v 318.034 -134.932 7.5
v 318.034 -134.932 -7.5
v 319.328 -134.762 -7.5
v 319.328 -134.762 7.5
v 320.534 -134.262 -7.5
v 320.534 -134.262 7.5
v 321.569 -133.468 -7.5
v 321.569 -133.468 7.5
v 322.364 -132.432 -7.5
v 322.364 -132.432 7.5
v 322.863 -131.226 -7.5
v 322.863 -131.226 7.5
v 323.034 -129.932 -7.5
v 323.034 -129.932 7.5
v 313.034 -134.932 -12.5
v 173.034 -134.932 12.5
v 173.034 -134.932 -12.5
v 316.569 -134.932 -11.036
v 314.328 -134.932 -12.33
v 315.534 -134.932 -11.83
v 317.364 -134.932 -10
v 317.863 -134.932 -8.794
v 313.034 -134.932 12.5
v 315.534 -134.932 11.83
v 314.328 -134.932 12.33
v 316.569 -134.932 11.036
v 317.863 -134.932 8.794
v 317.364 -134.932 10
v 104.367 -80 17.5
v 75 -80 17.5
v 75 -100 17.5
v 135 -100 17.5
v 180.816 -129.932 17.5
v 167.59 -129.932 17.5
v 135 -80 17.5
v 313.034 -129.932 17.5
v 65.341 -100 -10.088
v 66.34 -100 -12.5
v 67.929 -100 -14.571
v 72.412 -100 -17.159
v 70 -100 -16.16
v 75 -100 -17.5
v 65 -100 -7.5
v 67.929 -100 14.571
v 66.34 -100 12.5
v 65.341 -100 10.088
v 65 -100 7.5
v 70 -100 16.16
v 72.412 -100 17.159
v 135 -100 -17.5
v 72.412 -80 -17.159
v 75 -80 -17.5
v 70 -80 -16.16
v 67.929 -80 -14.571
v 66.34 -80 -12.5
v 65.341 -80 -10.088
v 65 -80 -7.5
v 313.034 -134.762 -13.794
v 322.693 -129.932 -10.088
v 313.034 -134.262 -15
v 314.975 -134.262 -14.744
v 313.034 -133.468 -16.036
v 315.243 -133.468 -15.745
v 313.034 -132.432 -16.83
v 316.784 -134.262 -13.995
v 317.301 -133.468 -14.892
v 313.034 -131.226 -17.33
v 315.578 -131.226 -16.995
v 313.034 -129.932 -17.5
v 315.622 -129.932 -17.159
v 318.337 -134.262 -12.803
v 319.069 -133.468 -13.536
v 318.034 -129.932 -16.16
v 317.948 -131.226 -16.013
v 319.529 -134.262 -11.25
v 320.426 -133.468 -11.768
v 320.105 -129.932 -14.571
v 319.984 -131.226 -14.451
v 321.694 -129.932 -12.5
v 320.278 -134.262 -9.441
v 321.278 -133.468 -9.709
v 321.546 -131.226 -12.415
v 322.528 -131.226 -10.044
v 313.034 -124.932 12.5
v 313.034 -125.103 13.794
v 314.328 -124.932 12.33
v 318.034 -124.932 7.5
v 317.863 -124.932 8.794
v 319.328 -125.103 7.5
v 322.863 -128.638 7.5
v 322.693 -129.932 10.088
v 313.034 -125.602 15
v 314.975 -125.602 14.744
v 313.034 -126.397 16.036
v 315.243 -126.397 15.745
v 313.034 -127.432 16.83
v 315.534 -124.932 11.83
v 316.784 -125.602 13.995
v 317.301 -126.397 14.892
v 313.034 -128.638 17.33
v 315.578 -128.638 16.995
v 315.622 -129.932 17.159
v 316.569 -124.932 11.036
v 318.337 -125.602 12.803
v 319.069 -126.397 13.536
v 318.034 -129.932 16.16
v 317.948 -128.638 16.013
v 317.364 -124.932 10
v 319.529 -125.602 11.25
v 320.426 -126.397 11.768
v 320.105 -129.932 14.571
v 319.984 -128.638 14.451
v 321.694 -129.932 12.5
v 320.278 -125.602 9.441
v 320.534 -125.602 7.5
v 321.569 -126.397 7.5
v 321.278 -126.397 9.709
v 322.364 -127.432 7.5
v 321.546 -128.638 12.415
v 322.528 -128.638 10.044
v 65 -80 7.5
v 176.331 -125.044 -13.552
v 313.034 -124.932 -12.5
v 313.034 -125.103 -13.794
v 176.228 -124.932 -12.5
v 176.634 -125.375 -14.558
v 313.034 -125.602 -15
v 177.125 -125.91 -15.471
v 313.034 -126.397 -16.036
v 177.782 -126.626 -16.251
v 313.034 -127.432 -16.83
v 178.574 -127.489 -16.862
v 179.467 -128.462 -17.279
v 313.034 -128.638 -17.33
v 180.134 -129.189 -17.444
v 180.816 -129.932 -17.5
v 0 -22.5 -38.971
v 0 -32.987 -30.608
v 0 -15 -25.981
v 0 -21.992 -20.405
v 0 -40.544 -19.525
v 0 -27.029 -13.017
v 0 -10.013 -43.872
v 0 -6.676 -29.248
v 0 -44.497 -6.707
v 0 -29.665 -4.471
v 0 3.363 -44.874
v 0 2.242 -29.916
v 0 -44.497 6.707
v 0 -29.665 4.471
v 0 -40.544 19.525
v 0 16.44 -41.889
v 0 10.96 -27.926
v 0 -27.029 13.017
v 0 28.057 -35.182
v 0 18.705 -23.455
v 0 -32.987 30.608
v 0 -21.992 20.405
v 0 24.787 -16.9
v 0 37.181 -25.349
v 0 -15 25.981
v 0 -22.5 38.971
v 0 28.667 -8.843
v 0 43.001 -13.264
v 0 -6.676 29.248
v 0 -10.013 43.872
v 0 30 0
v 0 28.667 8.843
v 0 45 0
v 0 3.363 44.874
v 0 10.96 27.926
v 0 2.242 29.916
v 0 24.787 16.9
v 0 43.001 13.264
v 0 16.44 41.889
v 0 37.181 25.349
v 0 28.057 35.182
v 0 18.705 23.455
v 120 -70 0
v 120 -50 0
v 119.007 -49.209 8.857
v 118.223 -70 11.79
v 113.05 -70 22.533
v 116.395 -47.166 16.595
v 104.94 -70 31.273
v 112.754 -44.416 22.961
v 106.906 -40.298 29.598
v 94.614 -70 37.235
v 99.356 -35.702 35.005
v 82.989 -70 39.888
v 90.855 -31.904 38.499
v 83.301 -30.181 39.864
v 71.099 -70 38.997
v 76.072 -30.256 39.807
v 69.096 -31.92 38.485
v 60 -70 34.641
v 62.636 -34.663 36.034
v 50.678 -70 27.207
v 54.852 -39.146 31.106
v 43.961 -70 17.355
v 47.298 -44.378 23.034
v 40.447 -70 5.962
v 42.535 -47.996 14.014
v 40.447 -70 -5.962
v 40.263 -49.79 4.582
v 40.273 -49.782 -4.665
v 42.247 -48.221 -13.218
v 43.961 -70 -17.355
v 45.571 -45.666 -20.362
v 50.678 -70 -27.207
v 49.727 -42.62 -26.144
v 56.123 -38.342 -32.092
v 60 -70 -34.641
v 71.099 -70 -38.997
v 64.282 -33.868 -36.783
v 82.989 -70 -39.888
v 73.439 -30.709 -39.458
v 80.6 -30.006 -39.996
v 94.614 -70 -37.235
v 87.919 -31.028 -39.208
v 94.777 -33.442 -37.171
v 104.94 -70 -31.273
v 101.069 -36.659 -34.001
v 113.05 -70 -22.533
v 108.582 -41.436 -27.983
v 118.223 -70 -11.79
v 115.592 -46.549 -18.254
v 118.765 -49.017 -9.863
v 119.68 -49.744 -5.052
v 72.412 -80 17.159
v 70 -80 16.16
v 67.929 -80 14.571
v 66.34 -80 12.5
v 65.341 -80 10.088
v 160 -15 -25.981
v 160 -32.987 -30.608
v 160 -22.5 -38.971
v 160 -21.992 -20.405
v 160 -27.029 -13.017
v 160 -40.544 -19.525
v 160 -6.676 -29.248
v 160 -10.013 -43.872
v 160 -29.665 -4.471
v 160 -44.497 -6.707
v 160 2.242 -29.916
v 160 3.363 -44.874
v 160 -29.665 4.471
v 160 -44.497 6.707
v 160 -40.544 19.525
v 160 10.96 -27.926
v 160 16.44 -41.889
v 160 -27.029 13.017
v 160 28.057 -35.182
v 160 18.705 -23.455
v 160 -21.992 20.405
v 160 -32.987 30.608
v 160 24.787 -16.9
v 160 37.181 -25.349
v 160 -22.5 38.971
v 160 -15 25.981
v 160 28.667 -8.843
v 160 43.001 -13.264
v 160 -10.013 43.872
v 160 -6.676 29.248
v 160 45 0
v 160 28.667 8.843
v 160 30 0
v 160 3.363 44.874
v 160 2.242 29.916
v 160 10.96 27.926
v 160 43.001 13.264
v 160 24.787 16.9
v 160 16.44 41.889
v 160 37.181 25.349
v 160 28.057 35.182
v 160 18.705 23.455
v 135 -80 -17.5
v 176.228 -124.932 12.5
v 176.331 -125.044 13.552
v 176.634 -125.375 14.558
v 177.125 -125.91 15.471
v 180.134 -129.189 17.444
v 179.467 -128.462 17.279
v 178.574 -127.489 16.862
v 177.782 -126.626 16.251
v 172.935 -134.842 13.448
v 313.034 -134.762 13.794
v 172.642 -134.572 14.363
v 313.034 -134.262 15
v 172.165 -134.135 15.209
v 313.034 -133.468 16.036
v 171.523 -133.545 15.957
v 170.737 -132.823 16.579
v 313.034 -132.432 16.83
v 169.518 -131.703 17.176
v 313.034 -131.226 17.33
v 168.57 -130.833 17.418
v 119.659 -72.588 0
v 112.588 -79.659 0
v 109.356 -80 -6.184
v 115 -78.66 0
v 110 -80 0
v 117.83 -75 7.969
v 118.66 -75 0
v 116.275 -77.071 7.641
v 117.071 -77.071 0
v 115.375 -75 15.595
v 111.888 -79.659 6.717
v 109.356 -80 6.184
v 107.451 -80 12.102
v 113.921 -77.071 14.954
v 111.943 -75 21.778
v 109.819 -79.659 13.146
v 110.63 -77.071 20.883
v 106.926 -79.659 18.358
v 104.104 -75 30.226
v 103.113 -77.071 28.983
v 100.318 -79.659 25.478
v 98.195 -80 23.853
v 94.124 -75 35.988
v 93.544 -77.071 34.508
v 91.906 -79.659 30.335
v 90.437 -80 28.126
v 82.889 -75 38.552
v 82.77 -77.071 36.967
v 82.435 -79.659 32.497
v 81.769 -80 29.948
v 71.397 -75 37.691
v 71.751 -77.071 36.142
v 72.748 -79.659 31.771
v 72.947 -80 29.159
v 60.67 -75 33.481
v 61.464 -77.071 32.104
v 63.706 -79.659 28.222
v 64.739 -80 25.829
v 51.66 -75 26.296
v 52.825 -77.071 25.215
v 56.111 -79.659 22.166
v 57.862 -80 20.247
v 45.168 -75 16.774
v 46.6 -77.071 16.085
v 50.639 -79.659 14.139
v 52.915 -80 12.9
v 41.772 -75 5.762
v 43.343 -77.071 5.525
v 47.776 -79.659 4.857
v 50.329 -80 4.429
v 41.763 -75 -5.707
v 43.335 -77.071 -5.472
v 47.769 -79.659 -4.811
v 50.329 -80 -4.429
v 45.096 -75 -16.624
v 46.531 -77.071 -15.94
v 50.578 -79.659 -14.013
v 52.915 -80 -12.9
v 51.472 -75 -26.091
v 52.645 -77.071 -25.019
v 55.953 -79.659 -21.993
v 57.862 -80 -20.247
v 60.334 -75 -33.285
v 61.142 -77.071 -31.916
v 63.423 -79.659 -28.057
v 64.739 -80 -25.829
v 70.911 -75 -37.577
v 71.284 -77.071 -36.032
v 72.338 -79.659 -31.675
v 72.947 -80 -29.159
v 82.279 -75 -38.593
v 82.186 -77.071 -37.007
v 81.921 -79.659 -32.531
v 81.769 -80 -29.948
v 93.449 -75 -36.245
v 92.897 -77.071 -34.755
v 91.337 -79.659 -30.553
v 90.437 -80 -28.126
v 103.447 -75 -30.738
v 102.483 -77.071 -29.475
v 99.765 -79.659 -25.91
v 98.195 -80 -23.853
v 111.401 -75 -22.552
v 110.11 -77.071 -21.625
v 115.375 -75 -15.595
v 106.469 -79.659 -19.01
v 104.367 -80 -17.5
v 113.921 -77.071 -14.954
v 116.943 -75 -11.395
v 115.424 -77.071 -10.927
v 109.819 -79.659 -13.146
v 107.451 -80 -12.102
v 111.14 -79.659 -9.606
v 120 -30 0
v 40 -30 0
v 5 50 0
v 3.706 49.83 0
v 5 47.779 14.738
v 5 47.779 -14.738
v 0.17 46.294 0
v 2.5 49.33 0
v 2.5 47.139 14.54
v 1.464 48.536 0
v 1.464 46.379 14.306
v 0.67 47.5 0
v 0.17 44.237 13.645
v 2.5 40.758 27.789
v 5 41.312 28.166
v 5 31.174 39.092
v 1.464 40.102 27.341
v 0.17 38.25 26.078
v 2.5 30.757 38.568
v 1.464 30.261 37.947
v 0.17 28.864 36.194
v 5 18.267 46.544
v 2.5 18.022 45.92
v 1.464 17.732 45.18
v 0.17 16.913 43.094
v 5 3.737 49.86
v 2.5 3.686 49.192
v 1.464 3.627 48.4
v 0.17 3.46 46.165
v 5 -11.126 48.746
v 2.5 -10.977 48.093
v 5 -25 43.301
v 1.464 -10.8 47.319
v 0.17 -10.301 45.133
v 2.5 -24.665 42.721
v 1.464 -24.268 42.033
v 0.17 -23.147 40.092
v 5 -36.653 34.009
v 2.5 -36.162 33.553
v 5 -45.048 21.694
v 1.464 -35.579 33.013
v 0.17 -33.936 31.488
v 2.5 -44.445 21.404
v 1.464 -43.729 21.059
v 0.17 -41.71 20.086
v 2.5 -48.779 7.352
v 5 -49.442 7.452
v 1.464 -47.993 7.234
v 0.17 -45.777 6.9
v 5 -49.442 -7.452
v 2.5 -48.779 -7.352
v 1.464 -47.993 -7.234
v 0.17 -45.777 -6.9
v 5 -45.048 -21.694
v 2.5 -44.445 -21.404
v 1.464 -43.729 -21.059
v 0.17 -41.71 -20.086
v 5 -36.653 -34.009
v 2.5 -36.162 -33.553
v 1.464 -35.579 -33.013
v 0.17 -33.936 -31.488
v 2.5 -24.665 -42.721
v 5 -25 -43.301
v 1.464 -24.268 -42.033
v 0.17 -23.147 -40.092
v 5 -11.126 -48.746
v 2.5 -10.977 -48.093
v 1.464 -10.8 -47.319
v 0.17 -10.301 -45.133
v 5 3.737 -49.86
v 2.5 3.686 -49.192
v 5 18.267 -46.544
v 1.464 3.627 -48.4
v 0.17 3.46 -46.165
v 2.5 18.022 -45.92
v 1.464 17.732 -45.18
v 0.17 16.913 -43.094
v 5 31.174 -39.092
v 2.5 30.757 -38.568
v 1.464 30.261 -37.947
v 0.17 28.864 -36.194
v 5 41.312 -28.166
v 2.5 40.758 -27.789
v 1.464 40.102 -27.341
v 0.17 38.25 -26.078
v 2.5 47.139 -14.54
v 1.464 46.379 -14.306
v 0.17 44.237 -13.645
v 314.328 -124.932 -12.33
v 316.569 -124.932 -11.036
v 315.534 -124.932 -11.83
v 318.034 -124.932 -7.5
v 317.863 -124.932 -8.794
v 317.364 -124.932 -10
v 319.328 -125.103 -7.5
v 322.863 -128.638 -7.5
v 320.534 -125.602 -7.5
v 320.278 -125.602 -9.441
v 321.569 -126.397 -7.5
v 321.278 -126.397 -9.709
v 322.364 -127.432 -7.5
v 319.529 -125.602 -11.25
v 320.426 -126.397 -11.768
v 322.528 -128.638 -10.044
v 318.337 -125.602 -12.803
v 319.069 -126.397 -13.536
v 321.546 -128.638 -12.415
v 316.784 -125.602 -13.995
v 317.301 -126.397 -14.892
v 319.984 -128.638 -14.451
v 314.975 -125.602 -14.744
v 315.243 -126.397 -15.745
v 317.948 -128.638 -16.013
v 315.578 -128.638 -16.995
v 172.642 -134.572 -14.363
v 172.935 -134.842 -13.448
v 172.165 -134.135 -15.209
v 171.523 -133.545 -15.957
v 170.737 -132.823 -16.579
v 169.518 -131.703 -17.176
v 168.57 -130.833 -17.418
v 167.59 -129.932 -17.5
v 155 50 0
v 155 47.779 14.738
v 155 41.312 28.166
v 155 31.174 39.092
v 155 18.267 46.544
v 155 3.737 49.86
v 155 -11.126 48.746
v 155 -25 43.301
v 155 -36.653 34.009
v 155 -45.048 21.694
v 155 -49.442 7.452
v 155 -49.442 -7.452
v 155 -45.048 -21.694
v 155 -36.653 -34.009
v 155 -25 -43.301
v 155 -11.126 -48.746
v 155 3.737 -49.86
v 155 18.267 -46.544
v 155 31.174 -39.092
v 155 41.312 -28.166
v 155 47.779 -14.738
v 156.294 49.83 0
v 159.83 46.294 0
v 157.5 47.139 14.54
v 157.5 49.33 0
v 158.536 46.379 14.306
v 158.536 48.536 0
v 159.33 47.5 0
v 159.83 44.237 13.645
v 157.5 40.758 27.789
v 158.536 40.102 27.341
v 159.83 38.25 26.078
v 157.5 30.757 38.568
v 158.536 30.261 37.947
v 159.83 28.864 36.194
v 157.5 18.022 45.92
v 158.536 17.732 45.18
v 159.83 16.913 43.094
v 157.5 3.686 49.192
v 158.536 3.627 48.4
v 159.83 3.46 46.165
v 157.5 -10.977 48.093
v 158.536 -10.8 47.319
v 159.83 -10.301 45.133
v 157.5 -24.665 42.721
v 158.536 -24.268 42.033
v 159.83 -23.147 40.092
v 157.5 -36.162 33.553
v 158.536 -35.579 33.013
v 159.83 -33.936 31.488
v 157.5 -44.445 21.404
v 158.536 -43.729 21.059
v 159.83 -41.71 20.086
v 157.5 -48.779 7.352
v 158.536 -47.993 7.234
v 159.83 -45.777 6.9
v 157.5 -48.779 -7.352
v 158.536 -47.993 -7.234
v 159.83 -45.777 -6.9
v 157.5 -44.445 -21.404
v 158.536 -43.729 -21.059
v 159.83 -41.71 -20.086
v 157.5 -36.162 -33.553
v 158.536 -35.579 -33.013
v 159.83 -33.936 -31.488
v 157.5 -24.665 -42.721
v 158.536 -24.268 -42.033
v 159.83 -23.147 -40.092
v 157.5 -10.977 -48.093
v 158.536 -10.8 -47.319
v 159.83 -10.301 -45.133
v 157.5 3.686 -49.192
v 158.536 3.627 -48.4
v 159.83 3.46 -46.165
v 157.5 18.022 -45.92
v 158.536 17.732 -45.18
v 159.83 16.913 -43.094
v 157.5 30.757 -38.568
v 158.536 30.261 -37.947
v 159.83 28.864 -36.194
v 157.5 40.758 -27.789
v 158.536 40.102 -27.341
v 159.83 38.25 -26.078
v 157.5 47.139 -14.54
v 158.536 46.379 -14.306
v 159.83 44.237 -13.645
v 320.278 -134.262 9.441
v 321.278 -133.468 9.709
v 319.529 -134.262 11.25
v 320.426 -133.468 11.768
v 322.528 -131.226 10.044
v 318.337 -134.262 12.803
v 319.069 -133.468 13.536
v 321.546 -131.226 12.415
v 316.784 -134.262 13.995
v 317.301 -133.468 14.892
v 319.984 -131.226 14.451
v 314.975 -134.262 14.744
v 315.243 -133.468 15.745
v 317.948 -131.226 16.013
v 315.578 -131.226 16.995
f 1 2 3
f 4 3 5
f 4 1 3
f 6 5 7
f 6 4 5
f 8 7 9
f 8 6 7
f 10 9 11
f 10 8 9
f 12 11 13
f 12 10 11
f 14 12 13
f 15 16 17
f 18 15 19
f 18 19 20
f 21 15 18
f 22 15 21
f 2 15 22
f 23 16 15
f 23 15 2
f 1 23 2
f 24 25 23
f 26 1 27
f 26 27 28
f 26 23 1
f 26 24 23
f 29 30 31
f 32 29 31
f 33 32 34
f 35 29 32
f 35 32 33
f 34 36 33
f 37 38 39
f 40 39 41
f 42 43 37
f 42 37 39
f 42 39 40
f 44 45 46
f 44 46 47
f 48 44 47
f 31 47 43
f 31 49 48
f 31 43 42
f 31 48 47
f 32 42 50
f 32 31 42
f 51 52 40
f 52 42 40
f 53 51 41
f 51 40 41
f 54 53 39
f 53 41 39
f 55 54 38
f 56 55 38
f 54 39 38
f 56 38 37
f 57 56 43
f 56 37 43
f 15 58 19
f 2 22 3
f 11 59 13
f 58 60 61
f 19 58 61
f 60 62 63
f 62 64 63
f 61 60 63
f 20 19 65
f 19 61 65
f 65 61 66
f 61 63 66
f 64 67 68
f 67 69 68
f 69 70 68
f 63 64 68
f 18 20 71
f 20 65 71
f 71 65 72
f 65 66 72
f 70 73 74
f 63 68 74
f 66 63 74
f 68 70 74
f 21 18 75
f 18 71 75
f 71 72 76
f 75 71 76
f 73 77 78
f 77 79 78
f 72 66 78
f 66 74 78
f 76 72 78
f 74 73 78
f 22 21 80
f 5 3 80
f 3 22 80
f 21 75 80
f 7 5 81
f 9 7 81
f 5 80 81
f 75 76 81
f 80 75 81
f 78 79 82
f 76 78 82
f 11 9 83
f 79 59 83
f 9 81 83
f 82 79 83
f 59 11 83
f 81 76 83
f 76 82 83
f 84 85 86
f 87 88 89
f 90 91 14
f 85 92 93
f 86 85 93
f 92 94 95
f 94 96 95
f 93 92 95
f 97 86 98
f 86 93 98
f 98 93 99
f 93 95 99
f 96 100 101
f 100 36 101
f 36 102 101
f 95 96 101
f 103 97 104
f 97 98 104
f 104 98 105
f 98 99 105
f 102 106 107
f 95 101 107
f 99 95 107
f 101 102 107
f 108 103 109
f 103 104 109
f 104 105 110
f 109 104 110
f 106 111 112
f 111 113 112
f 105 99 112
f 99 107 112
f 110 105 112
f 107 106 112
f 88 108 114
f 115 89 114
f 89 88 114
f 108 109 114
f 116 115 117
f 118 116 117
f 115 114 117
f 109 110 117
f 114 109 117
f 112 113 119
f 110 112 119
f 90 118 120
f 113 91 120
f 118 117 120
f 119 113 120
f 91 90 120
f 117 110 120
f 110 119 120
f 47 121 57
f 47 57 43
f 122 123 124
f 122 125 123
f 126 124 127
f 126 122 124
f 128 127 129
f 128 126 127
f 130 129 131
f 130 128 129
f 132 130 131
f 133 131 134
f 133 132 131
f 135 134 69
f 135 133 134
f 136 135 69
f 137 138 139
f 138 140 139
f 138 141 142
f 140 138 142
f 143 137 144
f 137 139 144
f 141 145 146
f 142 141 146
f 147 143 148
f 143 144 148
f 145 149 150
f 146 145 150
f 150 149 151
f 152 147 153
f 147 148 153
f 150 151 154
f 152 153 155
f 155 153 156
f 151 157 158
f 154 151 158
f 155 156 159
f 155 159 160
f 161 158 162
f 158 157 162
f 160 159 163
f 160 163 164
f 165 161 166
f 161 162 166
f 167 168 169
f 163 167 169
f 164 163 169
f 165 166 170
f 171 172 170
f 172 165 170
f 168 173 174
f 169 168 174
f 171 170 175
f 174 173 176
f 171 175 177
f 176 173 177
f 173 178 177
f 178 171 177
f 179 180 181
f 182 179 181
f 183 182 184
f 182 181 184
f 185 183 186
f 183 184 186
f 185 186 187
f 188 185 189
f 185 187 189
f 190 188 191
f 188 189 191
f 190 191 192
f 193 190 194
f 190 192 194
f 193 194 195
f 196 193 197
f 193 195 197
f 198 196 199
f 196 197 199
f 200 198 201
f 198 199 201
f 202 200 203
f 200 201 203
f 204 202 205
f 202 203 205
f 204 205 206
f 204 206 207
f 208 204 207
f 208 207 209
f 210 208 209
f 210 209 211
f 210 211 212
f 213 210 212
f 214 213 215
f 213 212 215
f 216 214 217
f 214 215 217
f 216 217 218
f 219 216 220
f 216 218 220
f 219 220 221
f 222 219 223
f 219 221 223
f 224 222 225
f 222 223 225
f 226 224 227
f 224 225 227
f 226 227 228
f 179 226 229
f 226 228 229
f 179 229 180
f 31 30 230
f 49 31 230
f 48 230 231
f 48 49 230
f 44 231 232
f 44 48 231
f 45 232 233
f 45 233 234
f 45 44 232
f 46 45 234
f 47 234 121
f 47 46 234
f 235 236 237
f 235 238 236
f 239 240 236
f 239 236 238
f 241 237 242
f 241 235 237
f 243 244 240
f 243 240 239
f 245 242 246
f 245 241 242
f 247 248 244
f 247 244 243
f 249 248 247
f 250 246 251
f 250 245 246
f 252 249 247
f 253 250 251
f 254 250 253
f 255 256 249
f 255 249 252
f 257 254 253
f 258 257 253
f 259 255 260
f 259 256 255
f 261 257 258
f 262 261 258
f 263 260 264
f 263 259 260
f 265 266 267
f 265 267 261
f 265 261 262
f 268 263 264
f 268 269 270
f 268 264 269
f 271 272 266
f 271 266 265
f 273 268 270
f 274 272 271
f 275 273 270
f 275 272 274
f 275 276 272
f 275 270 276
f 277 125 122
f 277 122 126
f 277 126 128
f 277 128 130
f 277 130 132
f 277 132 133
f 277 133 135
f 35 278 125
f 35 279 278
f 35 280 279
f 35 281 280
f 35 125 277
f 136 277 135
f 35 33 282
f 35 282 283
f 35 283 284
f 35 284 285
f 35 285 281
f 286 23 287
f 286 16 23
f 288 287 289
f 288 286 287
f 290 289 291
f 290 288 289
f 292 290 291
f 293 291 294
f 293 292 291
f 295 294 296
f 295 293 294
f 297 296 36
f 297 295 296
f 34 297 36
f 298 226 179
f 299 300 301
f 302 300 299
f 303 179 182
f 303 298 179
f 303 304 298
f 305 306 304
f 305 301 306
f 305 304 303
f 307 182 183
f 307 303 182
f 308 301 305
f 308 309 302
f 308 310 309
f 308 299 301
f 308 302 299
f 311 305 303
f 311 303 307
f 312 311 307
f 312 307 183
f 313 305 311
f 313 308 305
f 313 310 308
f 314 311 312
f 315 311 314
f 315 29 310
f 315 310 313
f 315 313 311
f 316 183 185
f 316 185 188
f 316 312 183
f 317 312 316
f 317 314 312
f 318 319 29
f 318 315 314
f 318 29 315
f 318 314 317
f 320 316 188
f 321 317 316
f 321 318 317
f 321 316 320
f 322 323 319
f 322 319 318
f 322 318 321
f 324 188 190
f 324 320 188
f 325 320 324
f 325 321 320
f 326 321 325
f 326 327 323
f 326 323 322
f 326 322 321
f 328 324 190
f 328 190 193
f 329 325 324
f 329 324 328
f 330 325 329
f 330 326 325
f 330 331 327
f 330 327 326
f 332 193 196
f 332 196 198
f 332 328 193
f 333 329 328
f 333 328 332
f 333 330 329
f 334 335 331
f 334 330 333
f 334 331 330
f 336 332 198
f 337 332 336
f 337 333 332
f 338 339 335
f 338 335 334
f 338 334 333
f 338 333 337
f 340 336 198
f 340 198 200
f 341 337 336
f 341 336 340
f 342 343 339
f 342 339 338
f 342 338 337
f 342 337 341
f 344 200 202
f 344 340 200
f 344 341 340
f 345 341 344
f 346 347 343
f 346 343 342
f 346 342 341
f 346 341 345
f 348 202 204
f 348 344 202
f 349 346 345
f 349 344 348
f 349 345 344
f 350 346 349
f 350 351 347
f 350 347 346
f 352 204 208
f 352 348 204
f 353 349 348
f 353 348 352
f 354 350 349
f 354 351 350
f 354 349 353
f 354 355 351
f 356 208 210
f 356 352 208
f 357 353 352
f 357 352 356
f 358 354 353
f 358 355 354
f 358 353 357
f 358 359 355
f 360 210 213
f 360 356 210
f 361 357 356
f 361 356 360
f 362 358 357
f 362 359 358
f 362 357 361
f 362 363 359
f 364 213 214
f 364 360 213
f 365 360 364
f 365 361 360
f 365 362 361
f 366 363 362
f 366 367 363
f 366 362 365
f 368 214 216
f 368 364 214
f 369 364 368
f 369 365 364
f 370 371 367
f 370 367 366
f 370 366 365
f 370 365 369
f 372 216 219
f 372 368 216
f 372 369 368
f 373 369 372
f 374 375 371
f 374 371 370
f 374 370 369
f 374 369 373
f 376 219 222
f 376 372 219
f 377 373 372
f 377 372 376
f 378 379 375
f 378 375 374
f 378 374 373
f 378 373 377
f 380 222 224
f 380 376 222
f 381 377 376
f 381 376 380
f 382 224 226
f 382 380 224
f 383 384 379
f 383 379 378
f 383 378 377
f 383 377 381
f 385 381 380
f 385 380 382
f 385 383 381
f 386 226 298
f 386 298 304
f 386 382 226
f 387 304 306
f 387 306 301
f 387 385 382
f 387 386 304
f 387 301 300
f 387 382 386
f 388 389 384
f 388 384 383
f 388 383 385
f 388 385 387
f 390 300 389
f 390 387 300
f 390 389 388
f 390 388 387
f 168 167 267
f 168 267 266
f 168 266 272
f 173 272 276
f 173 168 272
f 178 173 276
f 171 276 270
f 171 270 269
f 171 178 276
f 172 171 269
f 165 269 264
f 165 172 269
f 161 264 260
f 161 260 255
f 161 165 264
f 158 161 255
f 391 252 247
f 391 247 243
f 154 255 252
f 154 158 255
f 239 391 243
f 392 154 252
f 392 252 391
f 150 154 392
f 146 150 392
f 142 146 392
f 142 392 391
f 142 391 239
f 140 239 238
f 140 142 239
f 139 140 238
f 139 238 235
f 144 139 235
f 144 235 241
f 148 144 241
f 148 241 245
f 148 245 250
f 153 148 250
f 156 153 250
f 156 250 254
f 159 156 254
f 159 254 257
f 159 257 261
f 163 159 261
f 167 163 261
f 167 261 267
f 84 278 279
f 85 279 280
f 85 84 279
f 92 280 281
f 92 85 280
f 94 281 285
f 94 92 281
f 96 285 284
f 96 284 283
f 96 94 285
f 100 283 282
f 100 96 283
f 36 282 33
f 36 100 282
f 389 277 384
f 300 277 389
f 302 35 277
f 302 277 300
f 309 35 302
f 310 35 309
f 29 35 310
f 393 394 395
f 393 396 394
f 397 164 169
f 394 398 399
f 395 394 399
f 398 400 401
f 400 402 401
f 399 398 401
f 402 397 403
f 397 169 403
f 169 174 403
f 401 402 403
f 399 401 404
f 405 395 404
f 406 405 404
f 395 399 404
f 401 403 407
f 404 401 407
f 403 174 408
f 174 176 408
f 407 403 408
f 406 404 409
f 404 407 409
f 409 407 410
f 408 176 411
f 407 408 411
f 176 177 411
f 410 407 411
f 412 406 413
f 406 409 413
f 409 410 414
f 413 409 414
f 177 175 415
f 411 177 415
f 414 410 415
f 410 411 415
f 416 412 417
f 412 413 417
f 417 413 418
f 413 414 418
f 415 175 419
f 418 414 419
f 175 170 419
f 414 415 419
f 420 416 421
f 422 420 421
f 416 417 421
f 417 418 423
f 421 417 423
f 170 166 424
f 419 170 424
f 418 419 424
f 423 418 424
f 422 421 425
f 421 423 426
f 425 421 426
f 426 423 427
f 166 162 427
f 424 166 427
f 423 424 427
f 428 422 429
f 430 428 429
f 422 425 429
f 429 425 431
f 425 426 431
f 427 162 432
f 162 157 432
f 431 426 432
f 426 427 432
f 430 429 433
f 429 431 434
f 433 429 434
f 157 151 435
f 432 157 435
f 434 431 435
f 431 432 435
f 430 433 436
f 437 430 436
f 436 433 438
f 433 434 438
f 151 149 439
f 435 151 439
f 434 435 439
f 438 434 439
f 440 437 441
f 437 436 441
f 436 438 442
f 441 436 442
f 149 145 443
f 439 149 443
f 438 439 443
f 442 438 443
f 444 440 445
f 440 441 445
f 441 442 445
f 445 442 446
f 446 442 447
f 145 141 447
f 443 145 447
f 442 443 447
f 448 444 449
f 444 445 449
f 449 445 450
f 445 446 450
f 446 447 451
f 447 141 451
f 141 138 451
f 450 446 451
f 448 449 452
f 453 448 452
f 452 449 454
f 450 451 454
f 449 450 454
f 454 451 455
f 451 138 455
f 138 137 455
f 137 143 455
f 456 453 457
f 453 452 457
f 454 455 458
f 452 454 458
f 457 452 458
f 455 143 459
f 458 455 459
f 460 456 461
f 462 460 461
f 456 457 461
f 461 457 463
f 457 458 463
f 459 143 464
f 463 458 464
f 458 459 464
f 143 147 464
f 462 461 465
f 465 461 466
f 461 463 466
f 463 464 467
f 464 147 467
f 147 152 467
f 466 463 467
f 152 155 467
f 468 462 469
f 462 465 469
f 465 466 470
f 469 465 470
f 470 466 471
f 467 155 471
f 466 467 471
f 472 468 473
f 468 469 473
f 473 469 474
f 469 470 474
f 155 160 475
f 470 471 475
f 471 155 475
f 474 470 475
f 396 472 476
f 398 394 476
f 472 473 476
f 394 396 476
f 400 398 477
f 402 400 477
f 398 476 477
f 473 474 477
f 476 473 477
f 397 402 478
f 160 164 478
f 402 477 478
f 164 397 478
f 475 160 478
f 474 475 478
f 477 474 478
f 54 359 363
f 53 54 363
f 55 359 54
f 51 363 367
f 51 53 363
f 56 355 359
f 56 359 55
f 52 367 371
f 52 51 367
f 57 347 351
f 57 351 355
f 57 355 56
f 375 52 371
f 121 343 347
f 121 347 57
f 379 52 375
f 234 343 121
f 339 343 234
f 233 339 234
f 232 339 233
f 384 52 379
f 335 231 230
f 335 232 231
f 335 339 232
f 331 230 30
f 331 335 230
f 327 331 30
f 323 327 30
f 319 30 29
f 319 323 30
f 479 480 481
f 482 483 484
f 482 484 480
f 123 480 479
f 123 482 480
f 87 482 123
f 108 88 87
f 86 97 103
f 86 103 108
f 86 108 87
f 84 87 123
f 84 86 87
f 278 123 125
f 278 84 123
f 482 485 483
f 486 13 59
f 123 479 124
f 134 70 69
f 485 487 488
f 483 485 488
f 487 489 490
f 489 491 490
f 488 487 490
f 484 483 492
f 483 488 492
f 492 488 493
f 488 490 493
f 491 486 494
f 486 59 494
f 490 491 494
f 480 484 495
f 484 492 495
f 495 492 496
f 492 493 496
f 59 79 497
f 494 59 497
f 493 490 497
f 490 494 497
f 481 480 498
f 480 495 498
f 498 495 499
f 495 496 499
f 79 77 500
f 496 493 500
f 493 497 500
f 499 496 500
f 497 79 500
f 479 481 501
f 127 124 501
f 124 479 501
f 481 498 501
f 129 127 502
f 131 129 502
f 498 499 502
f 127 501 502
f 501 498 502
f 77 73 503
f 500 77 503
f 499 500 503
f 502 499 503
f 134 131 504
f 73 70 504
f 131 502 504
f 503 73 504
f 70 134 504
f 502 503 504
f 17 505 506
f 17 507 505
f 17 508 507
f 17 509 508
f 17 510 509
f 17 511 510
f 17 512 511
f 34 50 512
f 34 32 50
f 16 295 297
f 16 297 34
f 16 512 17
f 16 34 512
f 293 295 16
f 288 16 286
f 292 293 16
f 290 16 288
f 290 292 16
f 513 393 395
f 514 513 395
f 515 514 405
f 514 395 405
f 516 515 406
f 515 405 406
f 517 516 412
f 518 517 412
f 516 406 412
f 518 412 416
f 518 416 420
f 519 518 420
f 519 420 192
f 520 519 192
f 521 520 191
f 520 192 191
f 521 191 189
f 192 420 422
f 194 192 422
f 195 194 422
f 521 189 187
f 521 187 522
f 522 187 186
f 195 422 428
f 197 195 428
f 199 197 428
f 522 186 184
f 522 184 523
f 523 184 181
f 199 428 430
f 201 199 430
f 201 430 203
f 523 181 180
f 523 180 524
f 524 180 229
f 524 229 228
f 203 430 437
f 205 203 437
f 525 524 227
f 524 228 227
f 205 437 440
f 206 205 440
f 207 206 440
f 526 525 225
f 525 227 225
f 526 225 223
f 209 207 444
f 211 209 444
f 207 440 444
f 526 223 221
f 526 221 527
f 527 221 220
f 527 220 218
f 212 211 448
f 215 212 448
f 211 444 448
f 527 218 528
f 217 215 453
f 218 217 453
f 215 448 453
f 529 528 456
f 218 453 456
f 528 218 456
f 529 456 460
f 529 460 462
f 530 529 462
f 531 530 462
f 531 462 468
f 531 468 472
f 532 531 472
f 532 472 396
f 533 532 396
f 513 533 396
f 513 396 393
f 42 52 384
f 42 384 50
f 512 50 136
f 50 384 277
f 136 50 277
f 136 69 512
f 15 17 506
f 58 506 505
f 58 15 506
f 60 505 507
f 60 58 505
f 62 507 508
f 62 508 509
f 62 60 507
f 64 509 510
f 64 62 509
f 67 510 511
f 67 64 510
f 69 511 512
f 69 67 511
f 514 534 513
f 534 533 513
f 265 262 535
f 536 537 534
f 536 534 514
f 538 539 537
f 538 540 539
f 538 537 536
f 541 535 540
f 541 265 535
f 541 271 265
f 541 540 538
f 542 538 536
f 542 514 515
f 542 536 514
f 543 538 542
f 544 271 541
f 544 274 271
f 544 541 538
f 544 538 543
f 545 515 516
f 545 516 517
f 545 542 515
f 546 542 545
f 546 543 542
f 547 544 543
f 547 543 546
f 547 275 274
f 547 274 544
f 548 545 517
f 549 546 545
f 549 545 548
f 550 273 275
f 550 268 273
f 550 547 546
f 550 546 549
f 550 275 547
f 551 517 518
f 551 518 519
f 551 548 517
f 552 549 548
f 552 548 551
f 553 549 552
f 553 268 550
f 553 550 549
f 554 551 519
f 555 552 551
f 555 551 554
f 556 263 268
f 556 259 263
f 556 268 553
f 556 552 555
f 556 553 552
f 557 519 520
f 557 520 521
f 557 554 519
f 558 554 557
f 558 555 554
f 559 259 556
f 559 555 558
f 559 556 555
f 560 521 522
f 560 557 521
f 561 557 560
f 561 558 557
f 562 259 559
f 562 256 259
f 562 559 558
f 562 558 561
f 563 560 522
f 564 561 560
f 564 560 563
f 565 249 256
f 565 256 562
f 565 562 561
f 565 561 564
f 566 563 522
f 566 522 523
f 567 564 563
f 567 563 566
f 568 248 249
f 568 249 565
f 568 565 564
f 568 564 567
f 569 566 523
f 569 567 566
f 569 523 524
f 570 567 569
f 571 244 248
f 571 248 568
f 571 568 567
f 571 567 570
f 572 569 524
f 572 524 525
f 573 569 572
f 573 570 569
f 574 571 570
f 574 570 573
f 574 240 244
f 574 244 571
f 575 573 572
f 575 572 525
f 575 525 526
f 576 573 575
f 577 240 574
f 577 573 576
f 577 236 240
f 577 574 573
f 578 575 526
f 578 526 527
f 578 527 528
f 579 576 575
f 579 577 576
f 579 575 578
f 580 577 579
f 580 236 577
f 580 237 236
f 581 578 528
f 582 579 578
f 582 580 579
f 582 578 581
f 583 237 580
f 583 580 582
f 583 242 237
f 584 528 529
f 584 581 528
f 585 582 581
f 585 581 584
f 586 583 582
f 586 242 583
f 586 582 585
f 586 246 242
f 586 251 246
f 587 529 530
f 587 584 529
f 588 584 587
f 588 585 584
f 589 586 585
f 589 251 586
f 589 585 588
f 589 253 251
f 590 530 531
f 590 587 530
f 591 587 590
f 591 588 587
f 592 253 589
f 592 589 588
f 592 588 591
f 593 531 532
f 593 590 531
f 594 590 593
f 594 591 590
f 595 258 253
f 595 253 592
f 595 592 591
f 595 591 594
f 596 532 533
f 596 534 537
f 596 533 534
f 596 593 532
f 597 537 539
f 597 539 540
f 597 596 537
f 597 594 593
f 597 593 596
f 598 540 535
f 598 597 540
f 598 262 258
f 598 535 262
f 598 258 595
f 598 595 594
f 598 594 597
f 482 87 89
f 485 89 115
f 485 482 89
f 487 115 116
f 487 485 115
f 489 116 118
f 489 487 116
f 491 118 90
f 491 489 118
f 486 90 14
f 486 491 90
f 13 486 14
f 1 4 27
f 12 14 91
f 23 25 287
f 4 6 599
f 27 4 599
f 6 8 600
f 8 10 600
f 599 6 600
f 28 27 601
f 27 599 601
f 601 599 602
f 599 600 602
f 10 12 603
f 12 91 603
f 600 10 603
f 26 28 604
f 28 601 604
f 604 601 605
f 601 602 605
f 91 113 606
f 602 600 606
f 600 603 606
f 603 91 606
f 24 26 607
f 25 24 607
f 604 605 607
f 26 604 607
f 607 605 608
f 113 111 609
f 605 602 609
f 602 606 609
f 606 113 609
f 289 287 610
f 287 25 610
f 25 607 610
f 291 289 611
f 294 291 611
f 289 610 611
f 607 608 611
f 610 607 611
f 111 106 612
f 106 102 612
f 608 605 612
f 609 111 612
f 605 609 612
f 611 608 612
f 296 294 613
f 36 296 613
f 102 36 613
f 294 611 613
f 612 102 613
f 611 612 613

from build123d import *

# Parameters (mm, degrees)
F0_R     = 50
F0_R_2   = 30
F1_DEPTH = 160
F3_START = 30
F2_R     = 40
F3_DEPTH = 50
F4_R     = 10
F6_DEPTH = 17.5
F7_R     = 10
F8_R     = 4.99999
F9_R     = 5


# Not quite as in the source:
# - a fillet or chamfer is up to 0.001 mm smaller than in the source, because OpenCascade refuses the exact size


with BuildPart() as f1:
    # F0 (on Right) → F1 (new body)
    with BuildSketch(Plane.YZ):
        Circle(F0_R)
        Circle(F0_R_2, mode=Mode.SUBTRACT)
    extrude(amount=F1_DEPTH)

    # F2 (on Front) → F3 (join)
    with BuildSketch(Plane.XZ.offset(F3_START)):
        with Locations((80, 0)):
            Circle(F2_R)
    extrude(amount=F3_DEPTH)

    # F4
    f4_edges = [f1.edges().sort_by_distance(p)[0] for p in [
        (40, -80, 0),
    ]]
    fillet(f4_edges, radius=F4_R)

    # F5 (on Top) → F6 (join, symmetric)
    with BuildSketch(Plane.XY):
        Polygon((135, -80), (110, -80), (65, -80), (65, -100), (135, -100), (173.0335205793, -134.9323159456), (323.0335205793, -134.9323159456), (323.0335205793, -124.9323159456), (176.2279570103, -124.9323159456), align=None)
    extrude(amount=F6_DEPTH, both=True)

    # F7
    f7_edges = [f1.edges().sort_by_distance(p)[0] for p in [
        (65, -90, -17.5),
        (65, -90, 17.5),
        (323.033521, -129.932316, -17.5),
        (323.033521, -129.932316, 17.5),
    ]]
    fillet(f7_edges, radius=F7_R)

    # F8 (radius 5 in the source; OpenCascade refuses exactly that, so slightly less here)
    f8_edges = [f1.edges().sort_by_distance(p)[0] for p in [
        (243.033521, -134.932316, -17.5),
        (244.630739, -124.932316, -17.5),
    ]]
    fillet(f8_edges, radius=F8_R)

    # F9
    f9_edges = [f1.edges().sort_by_distance(p)[0] for p in [
        (160, -50, 0),
        (0, -50, 0),
    ]]
    fillet(f9_edges, radius=F9_R)


solid = f1.part
